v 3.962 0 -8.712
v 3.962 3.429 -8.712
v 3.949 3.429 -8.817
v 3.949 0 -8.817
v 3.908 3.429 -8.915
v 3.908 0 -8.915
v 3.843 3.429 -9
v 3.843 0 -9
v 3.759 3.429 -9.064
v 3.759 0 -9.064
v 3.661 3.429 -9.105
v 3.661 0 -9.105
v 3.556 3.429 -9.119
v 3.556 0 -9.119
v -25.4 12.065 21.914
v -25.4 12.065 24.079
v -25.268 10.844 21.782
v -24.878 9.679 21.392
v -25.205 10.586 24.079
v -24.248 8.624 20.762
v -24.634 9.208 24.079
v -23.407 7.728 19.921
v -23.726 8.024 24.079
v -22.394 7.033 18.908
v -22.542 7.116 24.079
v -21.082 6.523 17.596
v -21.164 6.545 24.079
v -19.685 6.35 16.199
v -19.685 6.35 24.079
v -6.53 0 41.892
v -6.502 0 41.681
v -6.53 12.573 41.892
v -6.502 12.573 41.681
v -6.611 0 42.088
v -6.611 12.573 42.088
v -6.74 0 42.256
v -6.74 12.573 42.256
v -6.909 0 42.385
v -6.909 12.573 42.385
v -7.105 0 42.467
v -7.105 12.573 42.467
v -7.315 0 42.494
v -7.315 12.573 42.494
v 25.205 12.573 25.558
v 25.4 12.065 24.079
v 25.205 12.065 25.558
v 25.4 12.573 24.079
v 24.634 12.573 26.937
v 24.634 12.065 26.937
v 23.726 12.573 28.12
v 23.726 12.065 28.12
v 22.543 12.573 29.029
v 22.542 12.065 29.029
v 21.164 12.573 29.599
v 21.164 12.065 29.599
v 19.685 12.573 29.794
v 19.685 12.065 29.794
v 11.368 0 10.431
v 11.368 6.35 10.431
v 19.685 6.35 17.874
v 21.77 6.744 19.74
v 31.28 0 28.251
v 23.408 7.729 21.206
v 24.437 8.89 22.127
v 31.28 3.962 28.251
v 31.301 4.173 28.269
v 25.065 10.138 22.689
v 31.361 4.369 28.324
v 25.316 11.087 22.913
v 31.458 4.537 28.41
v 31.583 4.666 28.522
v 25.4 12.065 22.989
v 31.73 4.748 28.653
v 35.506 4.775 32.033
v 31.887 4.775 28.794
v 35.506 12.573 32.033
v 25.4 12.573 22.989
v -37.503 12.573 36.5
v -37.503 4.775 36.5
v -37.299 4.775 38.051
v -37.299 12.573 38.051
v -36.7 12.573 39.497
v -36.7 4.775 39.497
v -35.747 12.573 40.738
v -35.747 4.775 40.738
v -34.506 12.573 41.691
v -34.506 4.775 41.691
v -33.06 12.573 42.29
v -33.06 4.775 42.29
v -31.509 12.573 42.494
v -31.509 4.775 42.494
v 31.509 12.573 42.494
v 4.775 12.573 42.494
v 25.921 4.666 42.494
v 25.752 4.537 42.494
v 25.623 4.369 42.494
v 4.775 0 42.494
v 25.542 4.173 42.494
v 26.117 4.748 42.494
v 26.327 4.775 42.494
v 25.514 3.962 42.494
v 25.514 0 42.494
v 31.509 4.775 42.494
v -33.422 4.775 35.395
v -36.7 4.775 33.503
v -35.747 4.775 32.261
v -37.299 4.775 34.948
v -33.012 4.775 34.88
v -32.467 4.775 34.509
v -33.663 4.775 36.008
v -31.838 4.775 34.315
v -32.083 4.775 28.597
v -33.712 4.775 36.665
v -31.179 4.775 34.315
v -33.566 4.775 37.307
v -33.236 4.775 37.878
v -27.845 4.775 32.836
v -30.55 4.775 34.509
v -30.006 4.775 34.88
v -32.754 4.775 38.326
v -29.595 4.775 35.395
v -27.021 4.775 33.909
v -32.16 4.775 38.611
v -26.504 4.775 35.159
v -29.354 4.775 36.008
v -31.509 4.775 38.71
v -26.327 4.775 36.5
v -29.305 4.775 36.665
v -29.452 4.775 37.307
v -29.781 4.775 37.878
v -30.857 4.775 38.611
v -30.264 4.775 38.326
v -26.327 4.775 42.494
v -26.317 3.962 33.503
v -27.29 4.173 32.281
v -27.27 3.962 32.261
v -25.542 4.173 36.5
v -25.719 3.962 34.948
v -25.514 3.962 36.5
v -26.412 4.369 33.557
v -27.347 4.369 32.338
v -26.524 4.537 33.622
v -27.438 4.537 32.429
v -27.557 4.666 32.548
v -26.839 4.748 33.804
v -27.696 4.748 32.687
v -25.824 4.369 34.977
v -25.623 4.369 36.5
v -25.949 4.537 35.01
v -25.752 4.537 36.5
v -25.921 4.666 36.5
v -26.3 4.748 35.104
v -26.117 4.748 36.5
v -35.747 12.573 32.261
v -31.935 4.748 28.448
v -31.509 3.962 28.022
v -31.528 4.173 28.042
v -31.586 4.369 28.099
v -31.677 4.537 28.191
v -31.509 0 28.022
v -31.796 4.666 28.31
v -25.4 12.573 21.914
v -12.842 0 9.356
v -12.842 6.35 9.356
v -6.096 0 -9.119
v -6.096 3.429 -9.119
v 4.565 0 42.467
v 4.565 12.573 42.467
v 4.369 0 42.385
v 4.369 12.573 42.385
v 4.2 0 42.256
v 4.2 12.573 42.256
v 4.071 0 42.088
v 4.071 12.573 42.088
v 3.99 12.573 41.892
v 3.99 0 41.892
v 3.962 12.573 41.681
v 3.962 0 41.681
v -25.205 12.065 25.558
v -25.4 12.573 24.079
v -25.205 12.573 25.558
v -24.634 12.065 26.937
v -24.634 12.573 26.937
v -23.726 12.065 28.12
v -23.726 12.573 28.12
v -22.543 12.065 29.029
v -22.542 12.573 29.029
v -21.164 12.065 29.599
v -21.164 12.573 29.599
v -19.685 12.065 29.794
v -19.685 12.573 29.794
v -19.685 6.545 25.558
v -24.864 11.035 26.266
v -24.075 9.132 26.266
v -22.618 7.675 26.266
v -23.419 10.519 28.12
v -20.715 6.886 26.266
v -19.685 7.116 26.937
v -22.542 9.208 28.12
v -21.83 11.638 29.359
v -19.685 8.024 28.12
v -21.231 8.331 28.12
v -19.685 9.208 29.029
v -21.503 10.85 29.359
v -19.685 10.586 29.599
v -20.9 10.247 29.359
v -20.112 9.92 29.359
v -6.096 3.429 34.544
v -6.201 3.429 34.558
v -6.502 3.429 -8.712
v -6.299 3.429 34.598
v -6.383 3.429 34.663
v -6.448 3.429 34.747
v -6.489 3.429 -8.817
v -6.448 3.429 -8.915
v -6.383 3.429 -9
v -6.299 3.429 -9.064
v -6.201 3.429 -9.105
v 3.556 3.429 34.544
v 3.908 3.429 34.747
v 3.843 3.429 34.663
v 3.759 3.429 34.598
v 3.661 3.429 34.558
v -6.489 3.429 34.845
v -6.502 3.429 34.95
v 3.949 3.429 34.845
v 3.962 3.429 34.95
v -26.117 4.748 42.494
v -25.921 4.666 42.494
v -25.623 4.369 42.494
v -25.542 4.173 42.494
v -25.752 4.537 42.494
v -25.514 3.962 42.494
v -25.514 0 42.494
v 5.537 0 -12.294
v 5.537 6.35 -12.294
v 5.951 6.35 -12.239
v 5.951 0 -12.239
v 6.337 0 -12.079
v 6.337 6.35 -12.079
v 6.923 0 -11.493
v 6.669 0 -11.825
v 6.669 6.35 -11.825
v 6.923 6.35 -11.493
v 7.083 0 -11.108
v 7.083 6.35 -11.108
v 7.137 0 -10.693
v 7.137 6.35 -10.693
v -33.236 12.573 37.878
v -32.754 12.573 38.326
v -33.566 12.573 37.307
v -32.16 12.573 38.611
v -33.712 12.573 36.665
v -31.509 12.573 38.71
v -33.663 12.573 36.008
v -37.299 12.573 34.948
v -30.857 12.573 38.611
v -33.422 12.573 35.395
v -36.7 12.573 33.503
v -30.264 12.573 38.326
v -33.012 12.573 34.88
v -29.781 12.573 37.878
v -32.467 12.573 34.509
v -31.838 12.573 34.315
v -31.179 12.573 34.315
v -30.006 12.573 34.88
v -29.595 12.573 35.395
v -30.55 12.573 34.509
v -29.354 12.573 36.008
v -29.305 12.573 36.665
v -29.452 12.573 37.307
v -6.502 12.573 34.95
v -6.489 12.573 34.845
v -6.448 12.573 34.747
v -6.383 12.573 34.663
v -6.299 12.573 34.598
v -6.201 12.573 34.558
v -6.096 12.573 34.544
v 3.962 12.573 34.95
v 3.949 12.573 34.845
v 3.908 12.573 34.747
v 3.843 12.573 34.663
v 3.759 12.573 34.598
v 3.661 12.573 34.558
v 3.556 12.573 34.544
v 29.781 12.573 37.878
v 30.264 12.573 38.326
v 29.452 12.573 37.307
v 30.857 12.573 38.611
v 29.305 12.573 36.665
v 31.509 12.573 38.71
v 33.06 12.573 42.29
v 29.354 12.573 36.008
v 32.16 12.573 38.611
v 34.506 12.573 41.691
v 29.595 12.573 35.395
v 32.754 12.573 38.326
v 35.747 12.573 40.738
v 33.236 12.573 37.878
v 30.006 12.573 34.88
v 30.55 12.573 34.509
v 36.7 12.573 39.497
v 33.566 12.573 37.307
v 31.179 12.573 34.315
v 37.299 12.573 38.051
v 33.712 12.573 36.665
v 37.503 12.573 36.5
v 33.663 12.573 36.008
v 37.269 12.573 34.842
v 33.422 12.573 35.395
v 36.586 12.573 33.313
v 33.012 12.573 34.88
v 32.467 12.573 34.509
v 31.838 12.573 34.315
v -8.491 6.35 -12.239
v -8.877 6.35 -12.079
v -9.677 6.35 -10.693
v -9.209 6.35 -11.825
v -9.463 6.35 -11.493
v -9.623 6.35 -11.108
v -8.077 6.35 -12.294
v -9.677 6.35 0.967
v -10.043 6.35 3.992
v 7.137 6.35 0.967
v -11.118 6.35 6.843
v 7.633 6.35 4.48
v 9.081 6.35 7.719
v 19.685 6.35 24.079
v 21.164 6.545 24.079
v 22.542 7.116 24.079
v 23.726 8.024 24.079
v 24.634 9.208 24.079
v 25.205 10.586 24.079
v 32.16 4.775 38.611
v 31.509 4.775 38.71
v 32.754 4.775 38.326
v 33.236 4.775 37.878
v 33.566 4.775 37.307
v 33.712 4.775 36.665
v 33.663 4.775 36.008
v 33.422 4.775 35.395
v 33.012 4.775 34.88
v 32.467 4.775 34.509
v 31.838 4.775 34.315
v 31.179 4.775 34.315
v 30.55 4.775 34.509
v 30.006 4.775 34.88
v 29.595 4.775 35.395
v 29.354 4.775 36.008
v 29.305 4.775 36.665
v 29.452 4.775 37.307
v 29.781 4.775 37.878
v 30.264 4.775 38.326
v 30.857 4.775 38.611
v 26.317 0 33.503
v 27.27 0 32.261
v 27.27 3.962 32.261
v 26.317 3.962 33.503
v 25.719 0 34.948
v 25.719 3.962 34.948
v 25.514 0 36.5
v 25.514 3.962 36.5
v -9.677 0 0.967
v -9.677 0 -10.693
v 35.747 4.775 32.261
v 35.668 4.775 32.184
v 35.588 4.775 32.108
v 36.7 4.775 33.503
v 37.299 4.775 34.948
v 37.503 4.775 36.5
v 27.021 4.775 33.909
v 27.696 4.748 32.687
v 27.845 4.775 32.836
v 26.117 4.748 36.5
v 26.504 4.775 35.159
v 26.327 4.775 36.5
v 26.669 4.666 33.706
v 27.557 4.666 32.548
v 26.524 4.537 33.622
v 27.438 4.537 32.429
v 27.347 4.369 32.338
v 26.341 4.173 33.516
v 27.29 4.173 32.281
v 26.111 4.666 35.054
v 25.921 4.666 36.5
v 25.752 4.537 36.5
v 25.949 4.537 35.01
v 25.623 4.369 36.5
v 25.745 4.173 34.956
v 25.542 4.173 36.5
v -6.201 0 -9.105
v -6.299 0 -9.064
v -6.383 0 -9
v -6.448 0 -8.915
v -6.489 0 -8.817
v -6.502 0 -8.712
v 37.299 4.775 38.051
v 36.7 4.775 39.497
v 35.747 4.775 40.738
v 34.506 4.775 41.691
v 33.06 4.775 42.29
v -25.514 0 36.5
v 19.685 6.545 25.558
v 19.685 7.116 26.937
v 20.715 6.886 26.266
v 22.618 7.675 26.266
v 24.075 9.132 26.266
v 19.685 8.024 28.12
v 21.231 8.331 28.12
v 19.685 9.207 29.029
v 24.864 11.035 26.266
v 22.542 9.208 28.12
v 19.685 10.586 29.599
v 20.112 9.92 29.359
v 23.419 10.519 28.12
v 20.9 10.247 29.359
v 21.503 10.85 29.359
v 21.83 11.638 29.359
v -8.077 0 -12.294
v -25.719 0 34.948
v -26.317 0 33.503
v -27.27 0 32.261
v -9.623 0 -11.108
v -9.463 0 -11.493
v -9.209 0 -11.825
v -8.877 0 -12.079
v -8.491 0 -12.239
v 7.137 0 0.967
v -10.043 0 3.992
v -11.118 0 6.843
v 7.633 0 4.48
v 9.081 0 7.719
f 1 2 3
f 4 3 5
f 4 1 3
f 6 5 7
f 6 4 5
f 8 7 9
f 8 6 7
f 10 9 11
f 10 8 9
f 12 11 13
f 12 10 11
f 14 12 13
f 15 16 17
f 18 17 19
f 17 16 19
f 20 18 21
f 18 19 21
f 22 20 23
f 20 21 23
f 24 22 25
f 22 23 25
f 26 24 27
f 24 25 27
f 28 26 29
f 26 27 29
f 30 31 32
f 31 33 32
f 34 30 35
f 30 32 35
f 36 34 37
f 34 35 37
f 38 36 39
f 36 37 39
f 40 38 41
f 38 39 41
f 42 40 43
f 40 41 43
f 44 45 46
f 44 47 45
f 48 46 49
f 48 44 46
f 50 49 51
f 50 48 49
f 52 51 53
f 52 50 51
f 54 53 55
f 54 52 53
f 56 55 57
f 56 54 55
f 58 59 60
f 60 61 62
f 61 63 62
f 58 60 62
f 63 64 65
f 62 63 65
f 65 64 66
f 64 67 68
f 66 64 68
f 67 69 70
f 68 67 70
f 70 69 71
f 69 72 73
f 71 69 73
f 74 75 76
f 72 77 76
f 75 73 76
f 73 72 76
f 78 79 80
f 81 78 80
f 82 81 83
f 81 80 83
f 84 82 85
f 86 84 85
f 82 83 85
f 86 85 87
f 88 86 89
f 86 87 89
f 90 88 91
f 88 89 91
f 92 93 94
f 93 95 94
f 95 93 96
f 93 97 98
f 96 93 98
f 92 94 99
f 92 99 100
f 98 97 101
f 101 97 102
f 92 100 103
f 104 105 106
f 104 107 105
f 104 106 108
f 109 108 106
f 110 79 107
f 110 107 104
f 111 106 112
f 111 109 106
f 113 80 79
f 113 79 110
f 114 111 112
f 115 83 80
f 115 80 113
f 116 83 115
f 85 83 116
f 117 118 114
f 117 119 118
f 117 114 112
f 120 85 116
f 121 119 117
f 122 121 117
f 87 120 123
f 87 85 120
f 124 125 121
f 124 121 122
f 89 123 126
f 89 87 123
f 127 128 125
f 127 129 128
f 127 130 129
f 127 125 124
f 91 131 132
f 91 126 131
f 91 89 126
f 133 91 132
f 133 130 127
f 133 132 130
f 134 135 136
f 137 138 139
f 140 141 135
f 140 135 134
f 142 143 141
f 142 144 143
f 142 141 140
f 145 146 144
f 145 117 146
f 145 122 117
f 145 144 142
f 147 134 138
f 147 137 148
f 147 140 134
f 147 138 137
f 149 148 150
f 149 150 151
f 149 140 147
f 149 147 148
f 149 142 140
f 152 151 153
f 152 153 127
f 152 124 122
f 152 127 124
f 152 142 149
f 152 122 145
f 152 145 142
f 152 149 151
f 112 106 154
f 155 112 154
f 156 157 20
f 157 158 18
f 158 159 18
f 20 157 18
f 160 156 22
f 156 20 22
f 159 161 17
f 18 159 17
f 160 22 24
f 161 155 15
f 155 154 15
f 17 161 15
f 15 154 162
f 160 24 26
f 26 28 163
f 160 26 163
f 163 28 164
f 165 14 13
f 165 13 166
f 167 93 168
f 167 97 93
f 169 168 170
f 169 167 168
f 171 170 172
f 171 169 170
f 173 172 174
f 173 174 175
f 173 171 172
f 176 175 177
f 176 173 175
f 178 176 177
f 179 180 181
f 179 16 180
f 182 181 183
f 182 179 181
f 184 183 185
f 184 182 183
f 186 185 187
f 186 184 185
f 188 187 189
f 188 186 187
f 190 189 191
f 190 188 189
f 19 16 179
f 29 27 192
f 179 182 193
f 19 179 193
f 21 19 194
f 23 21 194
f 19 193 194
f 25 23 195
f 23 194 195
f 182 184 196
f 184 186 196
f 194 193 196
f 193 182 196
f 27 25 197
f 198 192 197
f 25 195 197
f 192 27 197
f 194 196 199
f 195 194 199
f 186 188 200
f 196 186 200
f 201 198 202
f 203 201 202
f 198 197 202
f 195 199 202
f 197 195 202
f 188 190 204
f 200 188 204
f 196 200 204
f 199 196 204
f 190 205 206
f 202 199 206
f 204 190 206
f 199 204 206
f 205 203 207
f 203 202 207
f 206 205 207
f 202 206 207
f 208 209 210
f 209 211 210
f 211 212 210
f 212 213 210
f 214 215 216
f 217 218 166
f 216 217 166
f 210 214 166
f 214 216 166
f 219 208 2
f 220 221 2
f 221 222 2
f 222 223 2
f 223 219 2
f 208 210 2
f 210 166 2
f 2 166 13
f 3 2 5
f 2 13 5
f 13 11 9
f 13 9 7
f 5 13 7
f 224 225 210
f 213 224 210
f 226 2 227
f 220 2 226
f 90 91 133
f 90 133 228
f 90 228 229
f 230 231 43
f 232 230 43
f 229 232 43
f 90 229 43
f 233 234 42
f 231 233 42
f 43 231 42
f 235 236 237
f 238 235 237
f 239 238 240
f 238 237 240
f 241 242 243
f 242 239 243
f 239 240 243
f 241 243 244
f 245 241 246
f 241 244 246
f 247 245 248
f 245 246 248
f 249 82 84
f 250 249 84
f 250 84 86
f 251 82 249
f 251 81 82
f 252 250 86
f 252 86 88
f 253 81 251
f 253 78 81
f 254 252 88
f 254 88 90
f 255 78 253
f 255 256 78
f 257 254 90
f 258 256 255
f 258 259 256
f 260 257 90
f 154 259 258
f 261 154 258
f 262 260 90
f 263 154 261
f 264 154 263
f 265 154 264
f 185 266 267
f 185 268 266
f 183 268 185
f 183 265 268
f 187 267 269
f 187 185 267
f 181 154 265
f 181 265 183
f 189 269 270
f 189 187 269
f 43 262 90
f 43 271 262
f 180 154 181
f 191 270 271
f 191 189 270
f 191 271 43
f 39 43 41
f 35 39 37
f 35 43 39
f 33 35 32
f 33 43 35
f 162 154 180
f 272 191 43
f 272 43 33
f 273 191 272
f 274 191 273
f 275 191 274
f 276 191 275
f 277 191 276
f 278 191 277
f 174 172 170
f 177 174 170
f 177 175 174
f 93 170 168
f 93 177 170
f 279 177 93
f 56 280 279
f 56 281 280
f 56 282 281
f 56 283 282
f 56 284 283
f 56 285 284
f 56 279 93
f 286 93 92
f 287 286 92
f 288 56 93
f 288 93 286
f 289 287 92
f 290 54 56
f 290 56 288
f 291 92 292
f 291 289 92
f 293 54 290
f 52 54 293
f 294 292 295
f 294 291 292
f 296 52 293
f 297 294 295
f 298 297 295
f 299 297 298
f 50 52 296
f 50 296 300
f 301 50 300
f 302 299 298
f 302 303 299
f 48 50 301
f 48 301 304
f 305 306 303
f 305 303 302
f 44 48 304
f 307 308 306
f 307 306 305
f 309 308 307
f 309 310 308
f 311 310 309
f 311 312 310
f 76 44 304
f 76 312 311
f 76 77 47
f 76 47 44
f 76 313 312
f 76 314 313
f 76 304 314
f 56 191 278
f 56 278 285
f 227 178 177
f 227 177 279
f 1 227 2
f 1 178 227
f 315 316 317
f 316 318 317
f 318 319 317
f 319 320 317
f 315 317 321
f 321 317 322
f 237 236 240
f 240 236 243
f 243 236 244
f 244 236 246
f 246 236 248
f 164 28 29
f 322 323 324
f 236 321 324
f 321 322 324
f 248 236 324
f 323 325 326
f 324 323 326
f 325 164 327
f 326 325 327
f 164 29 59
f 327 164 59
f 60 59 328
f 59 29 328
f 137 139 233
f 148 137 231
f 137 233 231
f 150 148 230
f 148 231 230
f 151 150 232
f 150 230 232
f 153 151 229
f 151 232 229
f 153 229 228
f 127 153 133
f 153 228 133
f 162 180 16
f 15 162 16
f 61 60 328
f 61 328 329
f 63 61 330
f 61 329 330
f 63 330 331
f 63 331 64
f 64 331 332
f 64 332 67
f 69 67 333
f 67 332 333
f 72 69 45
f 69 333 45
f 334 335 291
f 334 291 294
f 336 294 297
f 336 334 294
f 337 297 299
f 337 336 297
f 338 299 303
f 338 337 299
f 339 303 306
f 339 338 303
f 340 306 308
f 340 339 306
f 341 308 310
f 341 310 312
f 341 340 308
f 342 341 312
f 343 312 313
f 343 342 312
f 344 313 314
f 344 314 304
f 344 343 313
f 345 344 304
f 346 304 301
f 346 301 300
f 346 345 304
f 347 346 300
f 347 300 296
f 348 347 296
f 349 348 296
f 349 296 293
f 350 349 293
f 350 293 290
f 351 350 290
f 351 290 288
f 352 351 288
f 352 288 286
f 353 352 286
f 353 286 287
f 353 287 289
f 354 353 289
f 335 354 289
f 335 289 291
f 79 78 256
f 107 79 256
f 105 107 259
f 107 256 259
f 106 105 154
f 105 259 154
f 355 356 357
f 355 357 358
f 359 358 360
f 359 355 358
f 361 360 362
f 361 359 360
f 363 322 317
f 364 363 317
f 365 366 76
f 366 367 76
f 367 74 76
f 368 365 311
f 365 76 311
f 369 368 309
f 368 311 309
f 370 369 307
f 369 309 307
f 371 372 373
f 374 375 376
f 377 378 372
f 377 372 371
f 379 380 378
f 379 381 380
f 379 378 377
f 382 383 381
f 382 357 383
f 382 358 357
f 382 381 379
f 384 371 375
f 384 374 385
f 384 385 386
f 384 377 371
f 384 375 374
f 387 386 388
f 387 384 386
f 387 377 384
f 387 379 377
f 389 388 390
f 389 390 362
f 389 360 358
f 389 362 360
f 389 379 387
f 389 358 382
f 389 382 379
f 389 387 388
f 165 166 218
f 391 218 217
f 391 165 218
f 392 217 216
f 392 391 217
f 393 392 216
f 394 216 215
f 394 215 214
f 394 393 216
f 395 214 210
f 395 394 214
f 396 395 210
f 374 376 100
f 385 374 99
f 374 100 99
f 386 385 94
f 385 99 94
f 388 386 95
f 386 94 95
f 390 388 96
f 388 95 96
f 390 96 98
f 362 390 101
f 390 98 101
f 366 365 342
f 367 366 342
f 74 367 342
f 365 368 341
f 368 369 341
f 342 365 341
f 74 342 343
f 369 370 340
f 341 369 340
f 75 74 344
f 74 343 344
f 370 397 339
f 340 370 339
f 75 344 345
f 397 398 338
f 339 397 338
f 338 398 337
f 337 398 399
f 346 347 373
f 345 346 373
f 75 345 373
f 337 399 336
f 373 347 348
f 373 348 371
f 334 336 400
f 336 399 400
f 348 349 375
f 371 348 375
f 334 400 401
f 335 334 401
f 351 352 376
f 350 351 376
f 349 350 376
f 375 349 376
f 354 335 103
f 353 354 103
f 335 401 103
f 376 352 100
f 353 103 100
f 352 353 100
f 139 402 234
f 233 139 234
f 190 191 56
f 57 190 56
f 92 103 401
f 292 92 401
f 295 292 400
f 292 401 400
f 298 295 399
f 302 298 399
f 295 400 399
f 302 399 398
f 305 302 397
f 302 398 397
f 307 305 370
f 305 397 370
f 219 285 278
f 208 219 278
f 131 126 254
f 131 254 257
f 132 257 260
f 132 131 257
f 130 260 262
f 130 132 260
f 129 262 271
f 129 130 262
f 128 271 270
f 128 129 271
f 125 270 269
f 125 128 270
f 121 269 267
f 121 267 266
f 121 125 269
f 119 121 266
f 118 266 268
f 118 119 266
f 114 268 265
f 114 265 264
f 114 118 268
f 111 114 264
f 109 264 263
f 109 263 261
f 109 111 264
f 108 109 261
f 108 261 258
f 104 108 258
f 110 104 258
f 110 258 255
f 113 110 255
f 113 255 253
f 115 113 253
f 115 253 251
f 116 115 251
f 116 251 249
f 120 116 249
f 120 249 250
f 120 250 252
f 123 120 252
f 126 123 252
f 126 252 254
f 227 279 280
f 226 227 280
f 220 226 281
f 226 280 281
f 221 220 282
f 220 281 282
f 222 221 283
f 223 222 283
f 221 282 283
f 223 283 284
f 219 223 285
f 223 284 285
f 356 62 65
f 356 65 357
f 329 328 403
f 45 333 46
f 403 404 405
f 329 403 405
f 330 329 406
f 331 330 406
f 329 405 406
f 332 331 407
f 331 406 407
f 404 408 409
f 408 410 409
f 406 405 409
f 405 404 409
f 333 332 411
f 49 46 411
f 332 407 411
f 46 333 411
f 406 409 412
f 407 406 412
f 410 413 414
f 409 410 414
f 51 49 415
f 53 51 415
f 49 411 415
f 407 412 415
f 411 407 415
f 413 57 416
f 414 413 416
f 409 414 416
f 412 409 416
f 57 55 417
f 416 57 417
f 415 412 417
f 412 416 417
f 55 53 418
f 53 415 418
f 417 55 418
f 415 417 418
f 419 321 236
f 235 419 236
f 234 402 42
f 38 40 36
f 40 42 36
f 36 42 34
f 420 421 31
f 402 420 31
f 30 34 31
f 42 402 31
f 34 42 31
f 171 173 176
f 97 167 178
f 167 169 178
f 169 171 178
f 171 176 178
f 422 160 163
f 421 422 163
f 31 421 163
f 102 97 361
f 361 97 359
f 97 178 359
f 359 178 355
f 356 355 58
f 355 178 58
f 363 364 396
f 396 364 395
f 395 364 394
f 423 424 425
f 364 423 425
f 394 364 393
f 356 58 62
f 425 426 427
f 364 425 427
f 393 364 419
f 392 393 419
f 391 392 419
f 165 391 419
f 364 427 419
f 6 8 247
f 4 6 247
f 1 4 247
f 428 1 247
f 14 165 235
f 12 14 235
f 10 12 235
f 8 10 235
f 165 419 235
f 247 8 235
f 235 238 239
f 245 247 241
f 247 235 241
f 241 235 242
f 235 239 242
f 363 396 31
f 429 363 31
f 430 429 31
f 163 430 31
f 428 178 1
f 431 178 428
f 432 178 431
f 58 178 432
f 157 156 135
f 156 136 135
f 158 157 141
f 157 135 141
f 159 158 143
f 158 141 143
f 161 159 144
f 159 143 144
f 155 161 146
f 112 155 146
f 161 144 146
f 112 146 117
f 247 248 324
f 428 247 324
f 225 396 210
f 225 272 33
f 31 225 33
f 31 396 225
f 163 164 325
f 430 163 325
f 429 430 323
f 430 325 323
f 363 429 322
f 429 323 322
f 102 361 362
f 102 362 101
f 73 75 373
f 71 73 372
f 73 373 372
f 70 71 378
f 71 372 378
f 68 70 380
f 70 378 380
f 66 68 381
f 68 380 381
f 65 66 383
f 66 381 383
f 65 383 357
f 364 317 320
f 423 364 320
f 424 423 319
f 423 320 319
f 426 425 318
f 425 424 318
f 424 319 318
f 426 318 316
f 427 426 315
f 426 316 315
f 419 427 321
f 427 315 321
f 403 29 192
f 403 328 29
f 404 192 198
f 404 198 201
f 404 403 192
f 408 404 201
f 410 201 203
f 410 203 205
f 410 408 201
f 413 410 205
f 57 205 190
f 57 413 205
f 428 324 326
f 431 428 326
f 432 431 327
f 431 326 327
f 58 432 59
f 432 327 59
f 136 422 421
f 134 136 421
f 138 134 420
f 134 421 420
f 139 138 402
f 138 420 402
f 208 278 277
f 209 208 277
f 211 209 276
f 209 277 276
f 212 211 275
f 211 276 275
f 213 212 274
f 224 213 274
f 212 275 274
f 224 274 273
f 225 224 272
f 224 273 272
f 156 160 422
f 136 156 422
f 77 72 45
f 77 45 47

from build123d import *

# Parameters (mm, degrees)
SKETCH1_R               = 2.2098
BOSS_EXTRUDE1_DEPTH     = 12.573
CUT_EXTRUDE1_DEPTH      = 3.429
CUT_EXTRUDE1_DEPTH_BACK = 59.054456093
CUT_EXTRUDE5_DEPTH      = 59.054456093
CUT_EXTRUDE5_DEPTH_BACK = 59.054456093
CUT_EXTRUDE6_DEPTH      = 59.054456093
CUT_EXTRUDE6_DEPTH_BACK = 59.054456093
CUT_EXTRUDE7_DEPTH      = 68.574150882
CUT_EXTRUDE7_DEPTH_BACK = 42.0878
FILLET4_R               = 5.715
CUT_EXTRUDE8_START      = 59.054456093
SKETCH11_R              = 2.2098
CUT_EXTRUDE8_DEPTH      = 63.829656093
FILLET5_R               = 0.8128
FILLET6_R               = 0.8128


with BuildPart() as part:
    # Sketch1 → Boss-Extrude1 (new body)
    with BuildSketch(Plane(origin=(0, 0, 0), x_dir=(1, 0, 0), z_dir=(0, 1, 0))):
        with BuildLine():
            Line((-31.5087, -42.4942), (31.5087, -42.4942))
            ThreePointArc((31.5087, -42.4942), (35.747380889, -40.738480889), (37.5031, -36.4998))
            Line((37.5031, -36.4998), (37.5031, 36.4998))
            ThreePointArc((37.5031, 36.4998), (35.747380889, 40.738480889), (31.5087, 42.4942))
            Line((31.5087, 42.4942), (-31.5087, 42.4942))
            ThreePointArc((-31.5087, 42.4942), (-35.747380889, 40.738480889), (-37.5031, 36.4998))
            Line((-37.5031, 36.4998), (-37.5031, -36.4998))
            ThreePointArc((-37.5031, -36.4998), (-35.747380889, -40.738480889), (-31.5087, -42.4942))
        make_face()
        with Locations(Location((-31.5087, 36.4998, 0), (0, 0, 270))):
            Circle(SKETCH1_R, mode=Mode.SUBTRACT)
        with Locations(Location((31.5087, 36.4998, 0), (0, 0, 270))):
            Circle(SKETCH1_R, mode=Mode.SUBTRACT)
        with Locations(Location((31.5087, -36.4998, 0), (0, 0, 270))):
            Circle(SKETCH1_R, mode=Mode.SUBTRACT)
        with Locations(Location((-31.5087, -36.4998, 0), (0, 0, 270))):
            Circle(SKETCH1_R, mode=Mode.SUBTRACT)
    extrude(amount=BOSS_EXTRUDE1_DEPTH)

    # Sketch2 → Cut-Extrude1 (cut, two sides: drawn at the far end of the back side and taken through both)
    with BuildSketch(Plane(origin=(0, 0, 0), x_dir=(1, 0, 0), z_dir=(0, 1, 0)).offset(-CUT_EXTRUDE1_DEPTH_BACK)):
        with BuildLine():
            Line((-6.5024, -42.4942), (3.9624, -42.4942))
            Line((3.9624, -42.4942), (3.9624, 8.7122))
            ThreePointArc((3.9624, 8.7122), (3.843368196, 8.999568196), (3.556, 9.1186))
            Line((3.556, 9.1186), (-6.096, 9.1186))
            ThreePointArc((-6.096, 9.1186), (-6.383368196, 8.999568196), (-6.5024, 8.7122))
            Line((-6.5024, 8.7122), (-6.5024, -42.4942))
        make_face()
    extrude(amount=CUT_EXTRUDE1_DEPTH + CUT_EXTRUDE1_DEPTH_BACK, mode=Mode.SUBTRACT)

    # Sketch8 → Cut-Extrude5 (cut, two sides: drawn at the far end of the back side and taken through both)
    with BuildSketch(Plane.XZ.offset(-CUT_EXTRUDE5_DEPTH_BACK)):
        with BuildLine():
            Line((-6.5024, 42.4942), (3.9624, 42.4942))
            Line((3.9624, 42.4942), (3.9624, 34.9504))
            ThreePointArc((3.9624, 34.9504), (3.843368196, 34.663031804), (3.556, 34.544))
            Line((3.556, 34.544), (-6.096, 34.544))
            ThreePointArc((-6.096, 34.544), (-6.383368196, 34.663031804), (-6.5024, 34.9504))
            Line((-6.5024, 34.9504), (-6.5024, 42.4942))
        make_face()
    extrude(amount=CUT_EXTRUDE5_DEPTH + CUT_EXTRUDE5_DEPTH_BACK, mode=Mode.SUBTRACT)

    # Sketch9 → Cut-Extrude6 (cut, two sides: drawn at the far end of the back side and taken through both)
    with BuildSketch(Plane.XZ.offset(-CUT_EXTRUDE6_DEPTH_BACK)):
        with BuildLine():
            Line((-8.0772, -12.2936), (5.5372, -12.2936))
            ThreePointArc((5.5372, -12.2936), (6.668712271, -11.824912271), (7.1374, -10.6934))
            Line((7.1374, -10.6934), (7.1374, 0.967265238))
            ThreePointArc((7.1374, 0.967265238), (8.243209305, 6.150386126), (11.368068053, 10.430901768))
            Line((11.368068053, 10.430901768), (35.506224679, 32.032963558))
            ThreePointArc((35.506224679, 32.032963558), (36.981158008, 34.053366941), (37.5031, 36.4998))
            Line((37.5031, 36.4998), (37.5031, -42.4942))
            Line((37.5031, -42.4942), (-37.5031, -42.4942))
            Line((-37.5031, -42.4942), (-37.5031, 36.4998))
            ThreePointArc((-37.5031, 36.4998), (-37.04680347, 34.205842433), (-35.747380889, 32.261119111))
            Line((-35.747380889, 32.261119111), (-12.842144818, 9.35588304))
            ThreePointArc((-12.842144818, 9.35588304), (-10.494897301, 5.450135926), (-9.6774, 0.967265238))
            Line((-9.6774, 0.967265238), (-9.6774, -10.6934))
            ThreePointArc((-9.6774, -10.6934), (-9.208712271, -11.824912271), (-8.0772, -12.2936))
        make_face()
    extrude(amount=CUT_EXTRUDE6_DEPTH + CUT_EXTRUDE6_DEPTH_BACK, mode=Mode.SUBTRACT)

    # Sketch10 → Cut-Extrude7 (cut, two sides: drawn at the far end of the back side and taken through both)
    with BuildSketch(Plane(origin=(0, 0, -12.2936), x_dir=(-1, 0, 0), z_dir=(0, 0, -1)).offset(-CUT_EXTRUDE7_DEPTH_BACK)):
        with BuildLine():
            Line((-25.4, 12.573), (25.4, 12.573))
            Line((25.4, 12.573), (25.4, 12.065))
            ThreePointArc((25.4, 12.065), (23.726115254, 8.023884746), (19.685, 6.35))
            Line((19.685, 6.35), (-19.685, 6.35))
            ThreePointArc((-19.685, 6.35), (-23.726115254, 8.023884746), (-25.4, 12.065))
            Line((-25.4, 12.065), (-25.4, 12.573))
        make_face()
    extrude(amount=CUT_EXTRUDE7_DEPTH + CUT_EXTRUDE7_DEPTH_BACK, mode=Mode.SUBTRACT)

    # Fillet4
    fillet4_edges = [part.edges().sort_by_distance(p)[0] for p in [
        (-25.4, 12.319, 29.7942),
        (-23.726115254, 8.023884746, 29.7942),
        (25.4, 12.319, 29.7942),
        (23.726115254, 8.023884746, 29.7942),
        (0, 6.35, 29.7942),
    ]]
    fillet(fillet4_edges, radius=FILLET4_R)

    # Sketch11 → Cut-Extrude8 (cut)
    # profile 1 of 3: a face of its own
    with BuildSketch(Plane.XZ.offset(CUT_EXTRUDE8_START)):
        with BuildLine():
            Line((-37.5031, 22.028038222), (-31.5087, 28.022438222))
            Line((-31.5087, 28.022438222), (-35.747380889, 32.261119111))
            ThreePointArc((-35.747380889, 32.261119111), (-37.04680347, 34.205842433), (-37.5031, 36.4998))
            Line((-37.5031, 36.4998), (-37.5031, 22.028038222))
        make_face()
    # profile 2 of 3: a face of its own
    with BuildSketch(Plane.XZ.offset(CUT_EXTRUDE8_START)):
        with BuildLine():
            ThreePointArc((-27.270019111, 32.261119111), (-25.97059653, 34.205842433), (-25.5143, 36.4998))
            Line((-25.5143, 36.4998), (-25.5143, 42.4942))
            Line((-25.5143, 42.4942), (-31.5087, 42.4942))
            ThreePointArc((-31.5087, 42.4942), (-35.747380889, 40.738480889), (-37.5031, 36.4998))
            ThreePointArc((-37.5031, 36.4998), (-37.04680347, 34.205842433), (-35.747380889, 32.261119111))
            Line((-35.747380889, 32.261119111), (-31.5087, 28.022438222))
            Line((-31.5087, 28.022438222), (-27.270019111, 32.261119111))
        make_face()
        with Locations(Location((-31.5087, 36.4998, 0), (0, 0, 270))):
            Circle(SKETCH11_R, mode=Mode.SUBTRACT)
    # profile 3 of 3: a face of its own
    with BuildSketch(Plane.XZ.offset(CUT_EXTRUDE8_START)):
        with BuildLine():
            ThreePointArc((-37.5031, 36.4998), (-35.747380889, 40.738480889), (-31.5087, 42.4942))
            Line((-31.5087, 42.4942), (-37.5031, 42.4942))
            Line((-37.5031, 42.4942), (-37.5031, 36.4998))
        make_face()
    cut_extrude8 = extrude(amount=-CUT_EXTRUDE8_DEPTH, mode=Mode.SUBTRACT)

    # Mirror1: Cut-Extrude8 across plane
    add(cut_extrude8.mirror(Plane(origin=(0, 0, 0), x_dir=(0, 0, 1), z_dir=(1, 0, 0))), mode=Mode.SUBTRACT)

    # Fillet5
    fillet5_edges = [part.edges().sort_by_distance(p)[0] for p in [
        (-29.389359555, 4.7752, 30.141778666),
        (-25.97059653, 4.7752, 34.205842433),
        (-25.5143, 4.7752, 39.497),
        (29.275106564, 4.7752, 30.256031658),
        (25.97059653, 4.7752, 34.205842433),
        (25.5143, 4.7752, 39.497),
    ]]
    fillet(fillet5_edges, radius=FILLET5_R)

    # Fillet6
    fillet6_edges = [part.edges().sort_by_distance(p)[0] for p in [
        (-6.5024, 6.2865, 42.4942),
        (3.9624, 6.2865, 42.4942),
    ]]
    fillet(fillet6_edges, radius=FILLET6_R)


solid = part.part
